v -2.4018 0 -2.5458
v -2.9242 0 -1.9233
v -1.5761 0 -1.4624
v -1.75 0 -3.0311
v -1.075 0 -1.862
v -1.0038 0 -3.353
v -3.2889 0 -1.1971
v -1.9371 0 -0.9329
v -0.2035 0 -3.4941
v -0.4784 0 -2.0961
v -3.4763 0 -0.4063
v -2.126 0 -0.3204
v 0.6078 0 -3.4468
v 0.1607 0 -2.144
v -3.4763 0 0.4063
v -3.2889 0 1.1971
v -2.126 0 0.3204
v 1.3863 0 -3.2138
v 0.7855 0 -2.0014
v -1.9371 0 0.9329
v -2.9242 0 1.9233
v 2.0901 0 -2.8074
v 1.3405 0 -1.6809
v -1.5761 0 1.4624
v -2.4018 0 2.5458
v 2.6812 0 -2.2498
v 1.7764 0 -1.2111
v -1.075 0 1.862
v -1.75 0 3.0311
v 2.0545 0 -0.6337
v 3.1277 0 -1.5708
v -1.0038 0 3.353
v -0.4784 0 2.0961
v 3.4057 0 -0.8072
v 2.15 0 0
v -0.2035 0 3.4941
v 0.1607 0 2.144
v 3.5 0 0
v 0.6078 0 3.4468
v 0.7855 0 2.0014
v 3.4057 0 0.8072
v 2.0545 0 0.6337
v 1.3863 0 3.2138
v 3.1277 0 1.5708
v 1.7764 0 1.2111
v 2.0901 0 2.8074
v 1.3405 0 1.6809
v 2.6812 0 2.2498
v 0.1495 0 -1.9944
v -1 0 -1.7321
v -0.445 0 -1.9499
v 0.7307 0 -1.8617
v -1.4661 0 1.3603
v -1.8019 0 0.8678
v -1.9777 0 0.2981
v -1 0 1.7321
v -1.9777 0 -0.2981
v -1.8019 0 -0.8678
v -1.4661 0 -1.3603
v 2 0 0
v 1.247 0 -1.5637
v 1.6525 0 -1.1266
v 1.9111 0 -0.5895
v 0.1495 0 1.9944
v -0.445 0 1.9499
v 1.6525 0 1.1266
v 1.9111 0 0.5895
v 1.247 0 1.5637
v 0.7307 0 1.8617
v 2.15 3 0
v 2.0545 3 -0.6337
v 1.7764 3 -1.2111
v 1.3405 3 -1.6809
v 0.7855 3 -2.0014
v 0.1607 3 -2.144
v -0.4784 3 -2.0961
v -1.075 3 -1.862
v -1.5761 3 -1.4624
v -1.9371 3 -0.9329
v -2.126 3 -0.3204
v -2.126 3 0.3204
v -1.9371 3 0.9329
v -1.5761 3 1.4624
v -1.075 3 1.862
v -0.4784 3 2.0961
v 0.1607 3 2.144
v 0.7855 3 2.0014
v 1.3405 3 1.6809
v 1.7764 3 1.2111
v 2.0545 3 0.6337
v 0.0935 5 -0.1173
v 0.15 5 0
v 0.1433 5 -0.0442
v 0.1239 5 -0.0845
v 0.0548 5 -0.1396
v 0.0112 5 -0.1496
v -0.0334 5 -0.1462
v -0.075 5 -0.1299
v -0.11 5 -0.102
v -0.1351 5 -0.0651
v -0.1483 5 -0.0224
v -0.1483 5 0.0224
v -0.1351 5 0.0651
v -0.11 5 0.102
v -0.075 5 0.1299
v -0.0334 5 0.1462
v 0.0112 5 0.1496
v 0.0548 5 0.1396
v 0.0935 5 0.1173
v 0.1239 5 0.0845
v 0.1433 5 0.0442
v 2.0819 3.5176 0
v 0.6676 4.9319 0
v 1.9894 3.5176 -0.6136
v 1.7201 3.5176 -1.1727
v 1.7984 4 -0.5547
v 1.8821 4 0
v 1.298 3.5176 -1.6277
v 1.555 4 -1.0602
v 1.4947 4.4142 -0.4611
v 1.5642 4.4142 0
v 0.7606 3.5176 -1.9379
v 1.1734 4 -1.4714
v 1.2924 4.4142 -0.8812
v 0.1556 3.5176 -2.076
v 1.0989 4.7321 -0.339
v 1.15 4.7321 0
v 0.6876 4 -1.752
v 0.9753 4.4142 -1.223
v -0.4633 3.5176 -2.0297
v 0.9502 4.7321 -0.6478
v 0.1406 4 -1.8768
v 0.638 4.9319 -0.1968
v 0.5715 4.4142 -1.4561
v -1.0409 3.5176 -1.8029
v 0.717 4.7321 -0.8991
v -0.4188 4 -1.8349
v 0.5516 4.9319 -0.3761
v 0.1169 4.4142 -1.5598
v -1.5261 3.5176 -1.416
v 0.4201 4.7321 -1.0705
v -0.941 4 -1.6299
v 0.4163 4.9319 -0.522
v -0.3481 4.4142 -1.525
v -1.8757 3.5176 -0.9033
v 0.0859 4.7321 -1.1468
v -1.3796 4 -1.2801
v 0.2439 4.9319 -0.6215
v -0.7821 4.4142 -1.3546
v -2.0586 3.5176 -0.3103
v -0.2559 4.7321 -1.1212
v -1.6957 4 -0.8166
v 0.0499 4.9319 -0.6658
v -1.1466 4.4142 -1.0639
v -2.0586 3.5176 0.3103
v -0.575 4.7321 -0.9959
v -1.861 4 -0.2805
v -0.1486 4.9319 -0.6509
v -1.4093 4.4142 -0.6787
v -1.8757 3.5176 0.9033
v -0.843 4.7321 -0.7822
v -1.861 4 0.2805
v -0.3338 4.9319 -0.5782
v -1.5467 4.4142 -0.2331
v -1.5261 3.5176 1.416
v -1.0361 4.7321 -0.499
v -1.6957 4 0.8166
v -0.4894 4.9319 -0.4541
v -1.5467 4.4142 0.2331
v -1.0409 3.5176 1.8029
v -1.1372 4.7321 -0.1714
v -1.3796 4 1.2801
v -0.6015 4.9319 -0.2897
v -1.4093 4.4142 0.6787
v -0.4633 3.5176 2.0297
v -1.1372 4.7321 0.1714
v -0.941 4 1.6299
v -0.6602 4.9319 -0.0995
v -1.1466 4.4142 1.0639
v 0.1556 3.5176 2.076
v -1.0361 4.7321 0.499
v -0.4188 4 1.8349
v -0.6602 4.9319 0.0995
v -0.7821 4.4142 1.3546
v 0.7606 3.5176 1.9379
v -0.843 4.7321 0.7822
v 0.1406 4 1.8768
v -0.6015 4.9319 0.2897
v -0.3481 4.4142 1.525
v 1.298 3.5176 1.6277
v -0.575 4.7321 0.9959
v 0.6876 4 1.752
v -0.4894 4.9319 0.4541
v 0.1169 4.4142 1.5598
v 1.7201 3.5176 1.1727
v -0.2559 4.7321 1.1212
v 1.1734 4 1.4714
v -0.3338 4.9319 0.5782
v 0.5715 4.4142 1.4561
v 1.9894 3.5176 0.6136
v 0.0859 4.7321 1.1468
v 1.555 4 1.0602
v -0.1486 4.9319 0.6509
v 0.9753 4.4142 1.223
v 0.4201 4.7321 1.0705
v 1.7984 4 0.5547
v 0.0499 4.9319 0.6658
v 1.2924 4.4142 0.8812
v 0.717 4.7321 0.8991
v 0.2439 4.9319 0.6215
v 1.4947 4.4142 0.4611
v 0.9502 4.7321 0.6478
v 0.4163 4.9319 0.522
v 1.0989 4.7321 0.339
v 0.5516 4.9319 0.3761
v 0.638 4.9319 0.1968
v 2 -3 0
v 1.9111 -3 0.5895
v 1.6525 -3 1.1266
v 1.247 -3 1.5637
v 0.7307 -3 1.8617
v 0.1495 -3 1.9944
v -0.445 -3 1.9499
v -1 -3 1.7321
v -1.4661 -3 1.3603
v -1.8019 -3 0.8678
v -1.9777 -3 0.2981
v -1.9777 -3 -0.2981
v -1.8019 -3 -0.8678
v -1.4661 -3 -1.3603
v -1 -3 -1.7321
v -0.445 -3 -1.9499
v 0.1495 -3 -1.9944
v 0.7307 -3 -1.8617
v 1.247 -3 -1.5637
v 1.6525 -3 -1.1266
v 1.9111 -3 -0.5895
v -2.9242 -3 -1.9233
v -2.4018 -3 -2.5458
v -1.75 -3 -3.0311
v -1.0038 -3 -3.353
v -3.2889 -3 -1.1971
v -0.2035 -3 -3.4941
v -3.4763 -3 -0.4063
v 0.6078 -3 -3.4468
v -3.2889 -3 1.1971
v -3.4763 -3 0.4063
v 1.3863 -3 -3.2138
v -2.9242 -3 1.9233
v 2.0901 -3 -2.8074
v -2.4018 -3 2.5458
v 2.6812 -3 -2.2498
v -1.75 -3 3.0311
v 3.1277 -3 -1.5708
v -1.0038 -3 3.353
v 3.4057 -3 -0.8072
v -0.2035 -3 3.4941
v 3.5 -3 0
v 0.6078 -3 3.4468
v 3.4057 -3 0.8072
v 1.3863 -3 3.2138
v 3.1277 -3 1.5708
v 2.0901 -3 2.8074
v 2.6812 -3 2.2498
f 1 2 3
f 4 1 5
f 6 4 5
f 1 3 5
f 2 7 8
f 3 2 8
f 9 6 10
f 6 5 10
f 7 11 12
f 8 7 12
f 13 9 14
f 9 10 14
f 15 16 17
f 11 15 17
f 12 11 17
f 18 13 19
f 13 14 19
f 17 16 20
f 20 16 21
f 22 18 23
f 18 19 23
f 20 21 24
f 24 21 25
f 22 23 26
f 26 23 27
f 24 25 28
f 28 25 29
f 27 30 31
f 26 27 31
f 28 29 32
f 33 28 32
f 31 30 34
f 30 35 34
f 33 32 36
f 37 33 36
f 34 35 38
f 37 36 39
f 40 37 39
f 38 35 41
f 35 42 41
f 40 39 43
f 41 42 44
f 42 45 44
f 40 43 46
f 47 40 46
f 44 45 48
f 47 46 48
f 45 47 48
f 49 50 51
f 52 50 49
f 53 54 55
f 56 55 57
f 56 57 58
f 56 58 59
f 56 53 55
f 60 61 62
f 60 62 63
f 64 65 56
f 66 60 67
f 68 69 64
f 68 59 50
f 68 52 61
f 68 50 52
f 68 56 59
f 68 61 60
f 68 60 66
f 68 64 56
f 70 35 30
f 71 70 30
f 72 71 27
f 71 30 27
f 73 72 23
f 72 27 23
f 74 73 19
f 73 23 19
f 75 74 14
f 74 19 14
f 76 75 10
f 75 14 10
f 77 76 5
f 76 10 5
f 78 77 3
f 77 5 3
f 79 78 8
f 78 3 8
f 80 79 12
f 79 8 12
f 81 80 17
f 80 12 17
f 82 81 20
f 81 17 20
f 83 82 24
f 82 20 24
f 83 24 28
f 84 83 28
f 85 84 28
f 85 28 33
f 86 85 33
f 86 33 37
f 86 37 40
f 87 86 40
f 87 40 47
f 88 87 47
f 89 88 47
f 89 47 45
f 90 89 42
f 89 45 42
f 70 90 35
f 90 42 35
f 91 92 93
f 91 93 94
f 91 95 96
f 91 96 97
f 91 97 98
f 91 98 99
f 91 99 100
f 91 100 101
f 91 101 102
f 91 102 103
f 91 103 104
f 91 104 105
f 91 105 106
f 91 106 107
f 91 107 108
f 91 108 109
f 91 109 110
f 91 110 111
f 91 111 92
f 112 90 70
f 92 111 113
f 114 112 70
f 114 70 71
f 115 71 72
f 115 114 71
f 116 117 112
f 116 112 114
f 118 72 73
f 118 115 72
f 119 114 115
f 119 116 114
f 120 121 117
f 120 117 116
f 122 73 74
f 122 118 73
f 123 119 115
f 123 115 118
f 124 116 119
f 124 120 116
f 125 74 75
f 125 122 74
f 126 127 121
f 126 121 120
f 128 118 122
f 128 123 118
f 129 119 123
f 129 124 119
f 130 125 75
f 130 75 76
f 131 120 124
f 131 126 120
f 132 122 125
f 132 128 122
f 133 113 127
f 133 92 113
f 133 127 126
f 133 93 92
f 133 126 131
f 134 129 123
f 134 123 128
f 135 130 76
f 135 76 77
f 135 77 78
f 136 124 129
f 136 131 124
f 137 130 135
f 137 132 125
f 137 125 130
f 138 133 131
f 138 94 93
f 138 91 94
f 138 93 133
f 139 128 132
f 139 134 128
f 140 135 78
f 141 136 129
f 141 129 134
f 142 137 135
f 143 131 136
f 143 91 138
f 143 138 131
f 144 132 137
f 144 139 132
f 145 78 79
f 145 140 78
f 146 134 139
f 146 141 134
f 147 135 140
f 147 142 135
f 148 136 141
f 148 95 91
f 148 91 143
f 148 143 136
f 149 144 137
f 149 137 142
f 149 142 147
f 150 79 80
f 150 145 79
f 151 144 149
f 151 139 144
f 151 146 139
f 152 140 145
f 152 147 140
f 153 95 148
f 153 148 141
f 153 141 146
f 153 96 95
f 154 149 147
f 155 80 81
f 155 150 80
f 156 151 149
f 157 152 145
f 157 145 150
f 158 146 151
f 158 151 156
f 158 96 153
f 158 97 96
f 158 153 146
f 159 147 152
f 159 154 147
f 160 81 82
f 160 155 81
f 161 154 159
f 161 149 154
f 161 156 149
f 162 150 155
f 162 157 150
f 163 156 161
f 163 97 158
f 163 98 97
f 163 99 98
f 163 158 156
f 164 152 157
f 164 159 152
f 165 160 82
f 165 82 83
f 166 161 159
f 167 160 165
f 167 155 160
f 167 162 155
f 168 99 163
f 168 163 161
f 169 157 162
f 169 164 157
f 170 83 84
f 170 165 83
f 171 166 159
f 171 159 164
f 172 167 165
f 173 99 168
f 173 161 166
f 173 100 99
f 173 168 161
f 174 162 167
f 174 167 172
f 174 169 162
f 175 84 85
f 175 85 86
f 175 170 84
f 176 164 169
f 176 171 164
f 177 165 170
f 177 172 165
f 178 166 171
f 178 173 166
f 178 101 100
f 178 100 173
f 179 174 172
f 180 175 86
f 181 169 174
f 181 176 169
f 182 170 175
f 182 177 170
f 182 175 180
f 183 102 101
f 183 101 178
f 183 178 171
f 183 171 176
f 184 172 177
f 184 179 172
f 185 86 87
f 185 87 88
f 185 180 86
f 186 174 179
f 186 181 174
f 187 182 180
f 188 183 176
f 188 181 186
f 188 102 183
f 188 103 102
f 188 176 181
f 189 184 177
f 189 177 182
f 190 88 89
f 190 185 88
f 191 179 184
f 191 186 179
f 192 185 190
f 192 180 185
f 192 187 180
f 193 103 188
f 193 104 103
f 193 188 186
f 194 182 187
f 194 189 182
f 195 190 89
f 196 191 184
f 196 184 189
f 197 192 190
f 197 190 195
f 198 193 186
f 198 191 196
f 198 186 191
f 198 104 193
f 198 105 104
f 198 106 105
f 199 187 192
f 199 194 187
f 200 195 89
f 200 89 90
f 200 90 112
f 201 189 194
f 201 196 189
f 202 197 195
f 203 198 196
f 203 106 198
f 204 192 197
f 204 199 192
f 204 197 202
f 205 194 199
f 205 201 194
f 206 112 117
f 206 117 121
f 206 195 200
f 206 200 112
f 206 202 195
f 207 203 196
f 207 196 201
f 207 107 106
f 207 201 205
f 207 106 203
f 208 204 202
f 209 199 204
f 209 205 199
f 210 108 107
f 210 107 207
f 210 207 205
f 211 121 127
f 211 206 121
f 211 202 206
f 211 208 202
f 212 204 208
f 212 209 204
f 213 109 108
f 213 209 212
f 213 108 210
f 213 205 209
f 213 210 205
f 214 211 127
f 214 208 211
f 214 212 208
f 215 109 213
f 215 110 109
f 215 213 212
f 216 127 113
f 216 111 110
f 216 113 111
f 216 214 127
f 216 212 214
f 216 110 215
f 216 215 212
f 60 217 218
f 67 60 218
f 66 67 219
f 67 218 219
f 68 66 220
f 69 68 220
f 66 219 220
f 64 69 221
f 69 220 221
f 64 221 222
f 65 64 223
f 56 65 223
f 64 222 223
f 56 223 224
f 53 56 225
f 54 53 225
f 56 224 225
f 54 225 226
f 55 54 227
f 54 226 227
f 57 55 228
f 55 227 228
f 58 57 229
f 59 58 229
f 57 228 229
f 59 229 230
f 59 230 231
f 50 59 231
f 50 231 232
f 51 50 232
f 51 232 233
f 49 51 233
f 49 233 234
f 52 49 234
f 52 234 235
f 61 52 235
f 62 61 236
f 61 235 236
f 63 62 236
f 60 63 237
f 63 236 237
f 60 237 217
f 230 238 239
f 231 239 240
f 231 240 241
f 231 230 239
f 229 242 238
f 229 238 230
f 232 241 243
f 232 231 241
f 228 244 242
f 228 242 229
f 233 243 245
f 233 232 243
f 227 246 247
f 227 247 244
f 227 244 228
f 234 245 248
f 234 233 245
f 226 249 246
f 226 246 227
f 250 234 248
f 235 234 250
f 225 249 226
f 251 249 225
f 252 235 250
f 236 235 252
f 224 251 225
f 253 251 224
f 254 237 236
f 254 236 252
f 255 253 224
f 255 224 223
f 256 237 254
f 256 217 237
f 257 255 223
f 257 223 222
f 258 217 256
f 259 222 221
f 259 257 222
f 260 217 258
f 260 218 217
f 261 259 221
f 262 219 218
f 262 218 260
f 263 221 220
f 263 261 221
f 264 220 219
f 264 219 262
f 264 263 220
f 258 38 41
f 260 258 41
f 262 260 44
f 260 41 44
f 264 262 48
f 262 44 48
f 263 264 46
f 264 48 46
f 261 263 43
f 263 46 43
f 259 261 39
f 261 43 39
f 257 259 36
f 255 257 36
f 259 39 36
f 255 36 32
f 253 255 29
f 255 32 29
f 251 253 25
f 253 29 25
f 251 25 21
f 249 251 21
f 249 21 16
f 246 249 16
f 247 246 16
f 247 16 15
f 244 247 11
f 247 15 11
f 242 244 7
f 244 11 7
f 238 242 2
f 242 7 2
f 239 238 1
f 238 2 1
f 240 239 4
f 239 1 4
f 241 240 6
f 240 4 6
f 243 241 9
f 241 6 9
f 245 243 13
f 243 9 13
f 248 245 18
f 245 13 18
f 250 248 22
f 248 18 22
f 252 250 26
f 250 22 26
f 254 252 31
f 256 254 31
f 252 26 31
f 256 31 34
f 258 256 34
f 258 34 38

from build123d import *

# Parameters (mm, degrees)
SKETCH1_R           = 2.15
BOSS_EXTRUDE1_DEPTH = 5
SKETCH2_R           = 3.5
BOSS_EXTRUDE2_DEPTH = 3
SKETCH3_R           = 2
CUT_EXTRUDE1_DEPTH  = 3
FILLET1_R           = 2


with BuildPart() as part:
    # Sketch1 → Boss-Extrude1 (new body)
    with BuildSketch(Plane(origin=(0, 0, 0), x_dir=(1, 0, 0), z_dir=(0, 1, 0))):
        Circle(SKETCH1_R)
    extrude(amount=BOSS_EXTRUDE1_DEPTH)

    # Sketch2 → Boss-Extrude2 (add)
    with BuildSketch(Plane.XZ):
        Circle(SKETCH2_R)
    extrude(amount=BOSS_EXTRUDE2_DEPTH)

    # Sketch3 → Cut-Extrude1 (cut)
    with BuildSketch(Plane.XZ.offset(3)):
        Circle(SKETCH3_R)
    extrude(amount=-CUT_EXTRUDE1_DEPTH, mode=Mode.SUBTRACT)

    # Fillet1
    fillet1_edges = [part.edges().sort_by_distance(p)[0] for p in [
        (-2.15, 5, 0),
    ]]
    fillet(fillet1_edges, radius=FILLET1_R)


solid = part.part
